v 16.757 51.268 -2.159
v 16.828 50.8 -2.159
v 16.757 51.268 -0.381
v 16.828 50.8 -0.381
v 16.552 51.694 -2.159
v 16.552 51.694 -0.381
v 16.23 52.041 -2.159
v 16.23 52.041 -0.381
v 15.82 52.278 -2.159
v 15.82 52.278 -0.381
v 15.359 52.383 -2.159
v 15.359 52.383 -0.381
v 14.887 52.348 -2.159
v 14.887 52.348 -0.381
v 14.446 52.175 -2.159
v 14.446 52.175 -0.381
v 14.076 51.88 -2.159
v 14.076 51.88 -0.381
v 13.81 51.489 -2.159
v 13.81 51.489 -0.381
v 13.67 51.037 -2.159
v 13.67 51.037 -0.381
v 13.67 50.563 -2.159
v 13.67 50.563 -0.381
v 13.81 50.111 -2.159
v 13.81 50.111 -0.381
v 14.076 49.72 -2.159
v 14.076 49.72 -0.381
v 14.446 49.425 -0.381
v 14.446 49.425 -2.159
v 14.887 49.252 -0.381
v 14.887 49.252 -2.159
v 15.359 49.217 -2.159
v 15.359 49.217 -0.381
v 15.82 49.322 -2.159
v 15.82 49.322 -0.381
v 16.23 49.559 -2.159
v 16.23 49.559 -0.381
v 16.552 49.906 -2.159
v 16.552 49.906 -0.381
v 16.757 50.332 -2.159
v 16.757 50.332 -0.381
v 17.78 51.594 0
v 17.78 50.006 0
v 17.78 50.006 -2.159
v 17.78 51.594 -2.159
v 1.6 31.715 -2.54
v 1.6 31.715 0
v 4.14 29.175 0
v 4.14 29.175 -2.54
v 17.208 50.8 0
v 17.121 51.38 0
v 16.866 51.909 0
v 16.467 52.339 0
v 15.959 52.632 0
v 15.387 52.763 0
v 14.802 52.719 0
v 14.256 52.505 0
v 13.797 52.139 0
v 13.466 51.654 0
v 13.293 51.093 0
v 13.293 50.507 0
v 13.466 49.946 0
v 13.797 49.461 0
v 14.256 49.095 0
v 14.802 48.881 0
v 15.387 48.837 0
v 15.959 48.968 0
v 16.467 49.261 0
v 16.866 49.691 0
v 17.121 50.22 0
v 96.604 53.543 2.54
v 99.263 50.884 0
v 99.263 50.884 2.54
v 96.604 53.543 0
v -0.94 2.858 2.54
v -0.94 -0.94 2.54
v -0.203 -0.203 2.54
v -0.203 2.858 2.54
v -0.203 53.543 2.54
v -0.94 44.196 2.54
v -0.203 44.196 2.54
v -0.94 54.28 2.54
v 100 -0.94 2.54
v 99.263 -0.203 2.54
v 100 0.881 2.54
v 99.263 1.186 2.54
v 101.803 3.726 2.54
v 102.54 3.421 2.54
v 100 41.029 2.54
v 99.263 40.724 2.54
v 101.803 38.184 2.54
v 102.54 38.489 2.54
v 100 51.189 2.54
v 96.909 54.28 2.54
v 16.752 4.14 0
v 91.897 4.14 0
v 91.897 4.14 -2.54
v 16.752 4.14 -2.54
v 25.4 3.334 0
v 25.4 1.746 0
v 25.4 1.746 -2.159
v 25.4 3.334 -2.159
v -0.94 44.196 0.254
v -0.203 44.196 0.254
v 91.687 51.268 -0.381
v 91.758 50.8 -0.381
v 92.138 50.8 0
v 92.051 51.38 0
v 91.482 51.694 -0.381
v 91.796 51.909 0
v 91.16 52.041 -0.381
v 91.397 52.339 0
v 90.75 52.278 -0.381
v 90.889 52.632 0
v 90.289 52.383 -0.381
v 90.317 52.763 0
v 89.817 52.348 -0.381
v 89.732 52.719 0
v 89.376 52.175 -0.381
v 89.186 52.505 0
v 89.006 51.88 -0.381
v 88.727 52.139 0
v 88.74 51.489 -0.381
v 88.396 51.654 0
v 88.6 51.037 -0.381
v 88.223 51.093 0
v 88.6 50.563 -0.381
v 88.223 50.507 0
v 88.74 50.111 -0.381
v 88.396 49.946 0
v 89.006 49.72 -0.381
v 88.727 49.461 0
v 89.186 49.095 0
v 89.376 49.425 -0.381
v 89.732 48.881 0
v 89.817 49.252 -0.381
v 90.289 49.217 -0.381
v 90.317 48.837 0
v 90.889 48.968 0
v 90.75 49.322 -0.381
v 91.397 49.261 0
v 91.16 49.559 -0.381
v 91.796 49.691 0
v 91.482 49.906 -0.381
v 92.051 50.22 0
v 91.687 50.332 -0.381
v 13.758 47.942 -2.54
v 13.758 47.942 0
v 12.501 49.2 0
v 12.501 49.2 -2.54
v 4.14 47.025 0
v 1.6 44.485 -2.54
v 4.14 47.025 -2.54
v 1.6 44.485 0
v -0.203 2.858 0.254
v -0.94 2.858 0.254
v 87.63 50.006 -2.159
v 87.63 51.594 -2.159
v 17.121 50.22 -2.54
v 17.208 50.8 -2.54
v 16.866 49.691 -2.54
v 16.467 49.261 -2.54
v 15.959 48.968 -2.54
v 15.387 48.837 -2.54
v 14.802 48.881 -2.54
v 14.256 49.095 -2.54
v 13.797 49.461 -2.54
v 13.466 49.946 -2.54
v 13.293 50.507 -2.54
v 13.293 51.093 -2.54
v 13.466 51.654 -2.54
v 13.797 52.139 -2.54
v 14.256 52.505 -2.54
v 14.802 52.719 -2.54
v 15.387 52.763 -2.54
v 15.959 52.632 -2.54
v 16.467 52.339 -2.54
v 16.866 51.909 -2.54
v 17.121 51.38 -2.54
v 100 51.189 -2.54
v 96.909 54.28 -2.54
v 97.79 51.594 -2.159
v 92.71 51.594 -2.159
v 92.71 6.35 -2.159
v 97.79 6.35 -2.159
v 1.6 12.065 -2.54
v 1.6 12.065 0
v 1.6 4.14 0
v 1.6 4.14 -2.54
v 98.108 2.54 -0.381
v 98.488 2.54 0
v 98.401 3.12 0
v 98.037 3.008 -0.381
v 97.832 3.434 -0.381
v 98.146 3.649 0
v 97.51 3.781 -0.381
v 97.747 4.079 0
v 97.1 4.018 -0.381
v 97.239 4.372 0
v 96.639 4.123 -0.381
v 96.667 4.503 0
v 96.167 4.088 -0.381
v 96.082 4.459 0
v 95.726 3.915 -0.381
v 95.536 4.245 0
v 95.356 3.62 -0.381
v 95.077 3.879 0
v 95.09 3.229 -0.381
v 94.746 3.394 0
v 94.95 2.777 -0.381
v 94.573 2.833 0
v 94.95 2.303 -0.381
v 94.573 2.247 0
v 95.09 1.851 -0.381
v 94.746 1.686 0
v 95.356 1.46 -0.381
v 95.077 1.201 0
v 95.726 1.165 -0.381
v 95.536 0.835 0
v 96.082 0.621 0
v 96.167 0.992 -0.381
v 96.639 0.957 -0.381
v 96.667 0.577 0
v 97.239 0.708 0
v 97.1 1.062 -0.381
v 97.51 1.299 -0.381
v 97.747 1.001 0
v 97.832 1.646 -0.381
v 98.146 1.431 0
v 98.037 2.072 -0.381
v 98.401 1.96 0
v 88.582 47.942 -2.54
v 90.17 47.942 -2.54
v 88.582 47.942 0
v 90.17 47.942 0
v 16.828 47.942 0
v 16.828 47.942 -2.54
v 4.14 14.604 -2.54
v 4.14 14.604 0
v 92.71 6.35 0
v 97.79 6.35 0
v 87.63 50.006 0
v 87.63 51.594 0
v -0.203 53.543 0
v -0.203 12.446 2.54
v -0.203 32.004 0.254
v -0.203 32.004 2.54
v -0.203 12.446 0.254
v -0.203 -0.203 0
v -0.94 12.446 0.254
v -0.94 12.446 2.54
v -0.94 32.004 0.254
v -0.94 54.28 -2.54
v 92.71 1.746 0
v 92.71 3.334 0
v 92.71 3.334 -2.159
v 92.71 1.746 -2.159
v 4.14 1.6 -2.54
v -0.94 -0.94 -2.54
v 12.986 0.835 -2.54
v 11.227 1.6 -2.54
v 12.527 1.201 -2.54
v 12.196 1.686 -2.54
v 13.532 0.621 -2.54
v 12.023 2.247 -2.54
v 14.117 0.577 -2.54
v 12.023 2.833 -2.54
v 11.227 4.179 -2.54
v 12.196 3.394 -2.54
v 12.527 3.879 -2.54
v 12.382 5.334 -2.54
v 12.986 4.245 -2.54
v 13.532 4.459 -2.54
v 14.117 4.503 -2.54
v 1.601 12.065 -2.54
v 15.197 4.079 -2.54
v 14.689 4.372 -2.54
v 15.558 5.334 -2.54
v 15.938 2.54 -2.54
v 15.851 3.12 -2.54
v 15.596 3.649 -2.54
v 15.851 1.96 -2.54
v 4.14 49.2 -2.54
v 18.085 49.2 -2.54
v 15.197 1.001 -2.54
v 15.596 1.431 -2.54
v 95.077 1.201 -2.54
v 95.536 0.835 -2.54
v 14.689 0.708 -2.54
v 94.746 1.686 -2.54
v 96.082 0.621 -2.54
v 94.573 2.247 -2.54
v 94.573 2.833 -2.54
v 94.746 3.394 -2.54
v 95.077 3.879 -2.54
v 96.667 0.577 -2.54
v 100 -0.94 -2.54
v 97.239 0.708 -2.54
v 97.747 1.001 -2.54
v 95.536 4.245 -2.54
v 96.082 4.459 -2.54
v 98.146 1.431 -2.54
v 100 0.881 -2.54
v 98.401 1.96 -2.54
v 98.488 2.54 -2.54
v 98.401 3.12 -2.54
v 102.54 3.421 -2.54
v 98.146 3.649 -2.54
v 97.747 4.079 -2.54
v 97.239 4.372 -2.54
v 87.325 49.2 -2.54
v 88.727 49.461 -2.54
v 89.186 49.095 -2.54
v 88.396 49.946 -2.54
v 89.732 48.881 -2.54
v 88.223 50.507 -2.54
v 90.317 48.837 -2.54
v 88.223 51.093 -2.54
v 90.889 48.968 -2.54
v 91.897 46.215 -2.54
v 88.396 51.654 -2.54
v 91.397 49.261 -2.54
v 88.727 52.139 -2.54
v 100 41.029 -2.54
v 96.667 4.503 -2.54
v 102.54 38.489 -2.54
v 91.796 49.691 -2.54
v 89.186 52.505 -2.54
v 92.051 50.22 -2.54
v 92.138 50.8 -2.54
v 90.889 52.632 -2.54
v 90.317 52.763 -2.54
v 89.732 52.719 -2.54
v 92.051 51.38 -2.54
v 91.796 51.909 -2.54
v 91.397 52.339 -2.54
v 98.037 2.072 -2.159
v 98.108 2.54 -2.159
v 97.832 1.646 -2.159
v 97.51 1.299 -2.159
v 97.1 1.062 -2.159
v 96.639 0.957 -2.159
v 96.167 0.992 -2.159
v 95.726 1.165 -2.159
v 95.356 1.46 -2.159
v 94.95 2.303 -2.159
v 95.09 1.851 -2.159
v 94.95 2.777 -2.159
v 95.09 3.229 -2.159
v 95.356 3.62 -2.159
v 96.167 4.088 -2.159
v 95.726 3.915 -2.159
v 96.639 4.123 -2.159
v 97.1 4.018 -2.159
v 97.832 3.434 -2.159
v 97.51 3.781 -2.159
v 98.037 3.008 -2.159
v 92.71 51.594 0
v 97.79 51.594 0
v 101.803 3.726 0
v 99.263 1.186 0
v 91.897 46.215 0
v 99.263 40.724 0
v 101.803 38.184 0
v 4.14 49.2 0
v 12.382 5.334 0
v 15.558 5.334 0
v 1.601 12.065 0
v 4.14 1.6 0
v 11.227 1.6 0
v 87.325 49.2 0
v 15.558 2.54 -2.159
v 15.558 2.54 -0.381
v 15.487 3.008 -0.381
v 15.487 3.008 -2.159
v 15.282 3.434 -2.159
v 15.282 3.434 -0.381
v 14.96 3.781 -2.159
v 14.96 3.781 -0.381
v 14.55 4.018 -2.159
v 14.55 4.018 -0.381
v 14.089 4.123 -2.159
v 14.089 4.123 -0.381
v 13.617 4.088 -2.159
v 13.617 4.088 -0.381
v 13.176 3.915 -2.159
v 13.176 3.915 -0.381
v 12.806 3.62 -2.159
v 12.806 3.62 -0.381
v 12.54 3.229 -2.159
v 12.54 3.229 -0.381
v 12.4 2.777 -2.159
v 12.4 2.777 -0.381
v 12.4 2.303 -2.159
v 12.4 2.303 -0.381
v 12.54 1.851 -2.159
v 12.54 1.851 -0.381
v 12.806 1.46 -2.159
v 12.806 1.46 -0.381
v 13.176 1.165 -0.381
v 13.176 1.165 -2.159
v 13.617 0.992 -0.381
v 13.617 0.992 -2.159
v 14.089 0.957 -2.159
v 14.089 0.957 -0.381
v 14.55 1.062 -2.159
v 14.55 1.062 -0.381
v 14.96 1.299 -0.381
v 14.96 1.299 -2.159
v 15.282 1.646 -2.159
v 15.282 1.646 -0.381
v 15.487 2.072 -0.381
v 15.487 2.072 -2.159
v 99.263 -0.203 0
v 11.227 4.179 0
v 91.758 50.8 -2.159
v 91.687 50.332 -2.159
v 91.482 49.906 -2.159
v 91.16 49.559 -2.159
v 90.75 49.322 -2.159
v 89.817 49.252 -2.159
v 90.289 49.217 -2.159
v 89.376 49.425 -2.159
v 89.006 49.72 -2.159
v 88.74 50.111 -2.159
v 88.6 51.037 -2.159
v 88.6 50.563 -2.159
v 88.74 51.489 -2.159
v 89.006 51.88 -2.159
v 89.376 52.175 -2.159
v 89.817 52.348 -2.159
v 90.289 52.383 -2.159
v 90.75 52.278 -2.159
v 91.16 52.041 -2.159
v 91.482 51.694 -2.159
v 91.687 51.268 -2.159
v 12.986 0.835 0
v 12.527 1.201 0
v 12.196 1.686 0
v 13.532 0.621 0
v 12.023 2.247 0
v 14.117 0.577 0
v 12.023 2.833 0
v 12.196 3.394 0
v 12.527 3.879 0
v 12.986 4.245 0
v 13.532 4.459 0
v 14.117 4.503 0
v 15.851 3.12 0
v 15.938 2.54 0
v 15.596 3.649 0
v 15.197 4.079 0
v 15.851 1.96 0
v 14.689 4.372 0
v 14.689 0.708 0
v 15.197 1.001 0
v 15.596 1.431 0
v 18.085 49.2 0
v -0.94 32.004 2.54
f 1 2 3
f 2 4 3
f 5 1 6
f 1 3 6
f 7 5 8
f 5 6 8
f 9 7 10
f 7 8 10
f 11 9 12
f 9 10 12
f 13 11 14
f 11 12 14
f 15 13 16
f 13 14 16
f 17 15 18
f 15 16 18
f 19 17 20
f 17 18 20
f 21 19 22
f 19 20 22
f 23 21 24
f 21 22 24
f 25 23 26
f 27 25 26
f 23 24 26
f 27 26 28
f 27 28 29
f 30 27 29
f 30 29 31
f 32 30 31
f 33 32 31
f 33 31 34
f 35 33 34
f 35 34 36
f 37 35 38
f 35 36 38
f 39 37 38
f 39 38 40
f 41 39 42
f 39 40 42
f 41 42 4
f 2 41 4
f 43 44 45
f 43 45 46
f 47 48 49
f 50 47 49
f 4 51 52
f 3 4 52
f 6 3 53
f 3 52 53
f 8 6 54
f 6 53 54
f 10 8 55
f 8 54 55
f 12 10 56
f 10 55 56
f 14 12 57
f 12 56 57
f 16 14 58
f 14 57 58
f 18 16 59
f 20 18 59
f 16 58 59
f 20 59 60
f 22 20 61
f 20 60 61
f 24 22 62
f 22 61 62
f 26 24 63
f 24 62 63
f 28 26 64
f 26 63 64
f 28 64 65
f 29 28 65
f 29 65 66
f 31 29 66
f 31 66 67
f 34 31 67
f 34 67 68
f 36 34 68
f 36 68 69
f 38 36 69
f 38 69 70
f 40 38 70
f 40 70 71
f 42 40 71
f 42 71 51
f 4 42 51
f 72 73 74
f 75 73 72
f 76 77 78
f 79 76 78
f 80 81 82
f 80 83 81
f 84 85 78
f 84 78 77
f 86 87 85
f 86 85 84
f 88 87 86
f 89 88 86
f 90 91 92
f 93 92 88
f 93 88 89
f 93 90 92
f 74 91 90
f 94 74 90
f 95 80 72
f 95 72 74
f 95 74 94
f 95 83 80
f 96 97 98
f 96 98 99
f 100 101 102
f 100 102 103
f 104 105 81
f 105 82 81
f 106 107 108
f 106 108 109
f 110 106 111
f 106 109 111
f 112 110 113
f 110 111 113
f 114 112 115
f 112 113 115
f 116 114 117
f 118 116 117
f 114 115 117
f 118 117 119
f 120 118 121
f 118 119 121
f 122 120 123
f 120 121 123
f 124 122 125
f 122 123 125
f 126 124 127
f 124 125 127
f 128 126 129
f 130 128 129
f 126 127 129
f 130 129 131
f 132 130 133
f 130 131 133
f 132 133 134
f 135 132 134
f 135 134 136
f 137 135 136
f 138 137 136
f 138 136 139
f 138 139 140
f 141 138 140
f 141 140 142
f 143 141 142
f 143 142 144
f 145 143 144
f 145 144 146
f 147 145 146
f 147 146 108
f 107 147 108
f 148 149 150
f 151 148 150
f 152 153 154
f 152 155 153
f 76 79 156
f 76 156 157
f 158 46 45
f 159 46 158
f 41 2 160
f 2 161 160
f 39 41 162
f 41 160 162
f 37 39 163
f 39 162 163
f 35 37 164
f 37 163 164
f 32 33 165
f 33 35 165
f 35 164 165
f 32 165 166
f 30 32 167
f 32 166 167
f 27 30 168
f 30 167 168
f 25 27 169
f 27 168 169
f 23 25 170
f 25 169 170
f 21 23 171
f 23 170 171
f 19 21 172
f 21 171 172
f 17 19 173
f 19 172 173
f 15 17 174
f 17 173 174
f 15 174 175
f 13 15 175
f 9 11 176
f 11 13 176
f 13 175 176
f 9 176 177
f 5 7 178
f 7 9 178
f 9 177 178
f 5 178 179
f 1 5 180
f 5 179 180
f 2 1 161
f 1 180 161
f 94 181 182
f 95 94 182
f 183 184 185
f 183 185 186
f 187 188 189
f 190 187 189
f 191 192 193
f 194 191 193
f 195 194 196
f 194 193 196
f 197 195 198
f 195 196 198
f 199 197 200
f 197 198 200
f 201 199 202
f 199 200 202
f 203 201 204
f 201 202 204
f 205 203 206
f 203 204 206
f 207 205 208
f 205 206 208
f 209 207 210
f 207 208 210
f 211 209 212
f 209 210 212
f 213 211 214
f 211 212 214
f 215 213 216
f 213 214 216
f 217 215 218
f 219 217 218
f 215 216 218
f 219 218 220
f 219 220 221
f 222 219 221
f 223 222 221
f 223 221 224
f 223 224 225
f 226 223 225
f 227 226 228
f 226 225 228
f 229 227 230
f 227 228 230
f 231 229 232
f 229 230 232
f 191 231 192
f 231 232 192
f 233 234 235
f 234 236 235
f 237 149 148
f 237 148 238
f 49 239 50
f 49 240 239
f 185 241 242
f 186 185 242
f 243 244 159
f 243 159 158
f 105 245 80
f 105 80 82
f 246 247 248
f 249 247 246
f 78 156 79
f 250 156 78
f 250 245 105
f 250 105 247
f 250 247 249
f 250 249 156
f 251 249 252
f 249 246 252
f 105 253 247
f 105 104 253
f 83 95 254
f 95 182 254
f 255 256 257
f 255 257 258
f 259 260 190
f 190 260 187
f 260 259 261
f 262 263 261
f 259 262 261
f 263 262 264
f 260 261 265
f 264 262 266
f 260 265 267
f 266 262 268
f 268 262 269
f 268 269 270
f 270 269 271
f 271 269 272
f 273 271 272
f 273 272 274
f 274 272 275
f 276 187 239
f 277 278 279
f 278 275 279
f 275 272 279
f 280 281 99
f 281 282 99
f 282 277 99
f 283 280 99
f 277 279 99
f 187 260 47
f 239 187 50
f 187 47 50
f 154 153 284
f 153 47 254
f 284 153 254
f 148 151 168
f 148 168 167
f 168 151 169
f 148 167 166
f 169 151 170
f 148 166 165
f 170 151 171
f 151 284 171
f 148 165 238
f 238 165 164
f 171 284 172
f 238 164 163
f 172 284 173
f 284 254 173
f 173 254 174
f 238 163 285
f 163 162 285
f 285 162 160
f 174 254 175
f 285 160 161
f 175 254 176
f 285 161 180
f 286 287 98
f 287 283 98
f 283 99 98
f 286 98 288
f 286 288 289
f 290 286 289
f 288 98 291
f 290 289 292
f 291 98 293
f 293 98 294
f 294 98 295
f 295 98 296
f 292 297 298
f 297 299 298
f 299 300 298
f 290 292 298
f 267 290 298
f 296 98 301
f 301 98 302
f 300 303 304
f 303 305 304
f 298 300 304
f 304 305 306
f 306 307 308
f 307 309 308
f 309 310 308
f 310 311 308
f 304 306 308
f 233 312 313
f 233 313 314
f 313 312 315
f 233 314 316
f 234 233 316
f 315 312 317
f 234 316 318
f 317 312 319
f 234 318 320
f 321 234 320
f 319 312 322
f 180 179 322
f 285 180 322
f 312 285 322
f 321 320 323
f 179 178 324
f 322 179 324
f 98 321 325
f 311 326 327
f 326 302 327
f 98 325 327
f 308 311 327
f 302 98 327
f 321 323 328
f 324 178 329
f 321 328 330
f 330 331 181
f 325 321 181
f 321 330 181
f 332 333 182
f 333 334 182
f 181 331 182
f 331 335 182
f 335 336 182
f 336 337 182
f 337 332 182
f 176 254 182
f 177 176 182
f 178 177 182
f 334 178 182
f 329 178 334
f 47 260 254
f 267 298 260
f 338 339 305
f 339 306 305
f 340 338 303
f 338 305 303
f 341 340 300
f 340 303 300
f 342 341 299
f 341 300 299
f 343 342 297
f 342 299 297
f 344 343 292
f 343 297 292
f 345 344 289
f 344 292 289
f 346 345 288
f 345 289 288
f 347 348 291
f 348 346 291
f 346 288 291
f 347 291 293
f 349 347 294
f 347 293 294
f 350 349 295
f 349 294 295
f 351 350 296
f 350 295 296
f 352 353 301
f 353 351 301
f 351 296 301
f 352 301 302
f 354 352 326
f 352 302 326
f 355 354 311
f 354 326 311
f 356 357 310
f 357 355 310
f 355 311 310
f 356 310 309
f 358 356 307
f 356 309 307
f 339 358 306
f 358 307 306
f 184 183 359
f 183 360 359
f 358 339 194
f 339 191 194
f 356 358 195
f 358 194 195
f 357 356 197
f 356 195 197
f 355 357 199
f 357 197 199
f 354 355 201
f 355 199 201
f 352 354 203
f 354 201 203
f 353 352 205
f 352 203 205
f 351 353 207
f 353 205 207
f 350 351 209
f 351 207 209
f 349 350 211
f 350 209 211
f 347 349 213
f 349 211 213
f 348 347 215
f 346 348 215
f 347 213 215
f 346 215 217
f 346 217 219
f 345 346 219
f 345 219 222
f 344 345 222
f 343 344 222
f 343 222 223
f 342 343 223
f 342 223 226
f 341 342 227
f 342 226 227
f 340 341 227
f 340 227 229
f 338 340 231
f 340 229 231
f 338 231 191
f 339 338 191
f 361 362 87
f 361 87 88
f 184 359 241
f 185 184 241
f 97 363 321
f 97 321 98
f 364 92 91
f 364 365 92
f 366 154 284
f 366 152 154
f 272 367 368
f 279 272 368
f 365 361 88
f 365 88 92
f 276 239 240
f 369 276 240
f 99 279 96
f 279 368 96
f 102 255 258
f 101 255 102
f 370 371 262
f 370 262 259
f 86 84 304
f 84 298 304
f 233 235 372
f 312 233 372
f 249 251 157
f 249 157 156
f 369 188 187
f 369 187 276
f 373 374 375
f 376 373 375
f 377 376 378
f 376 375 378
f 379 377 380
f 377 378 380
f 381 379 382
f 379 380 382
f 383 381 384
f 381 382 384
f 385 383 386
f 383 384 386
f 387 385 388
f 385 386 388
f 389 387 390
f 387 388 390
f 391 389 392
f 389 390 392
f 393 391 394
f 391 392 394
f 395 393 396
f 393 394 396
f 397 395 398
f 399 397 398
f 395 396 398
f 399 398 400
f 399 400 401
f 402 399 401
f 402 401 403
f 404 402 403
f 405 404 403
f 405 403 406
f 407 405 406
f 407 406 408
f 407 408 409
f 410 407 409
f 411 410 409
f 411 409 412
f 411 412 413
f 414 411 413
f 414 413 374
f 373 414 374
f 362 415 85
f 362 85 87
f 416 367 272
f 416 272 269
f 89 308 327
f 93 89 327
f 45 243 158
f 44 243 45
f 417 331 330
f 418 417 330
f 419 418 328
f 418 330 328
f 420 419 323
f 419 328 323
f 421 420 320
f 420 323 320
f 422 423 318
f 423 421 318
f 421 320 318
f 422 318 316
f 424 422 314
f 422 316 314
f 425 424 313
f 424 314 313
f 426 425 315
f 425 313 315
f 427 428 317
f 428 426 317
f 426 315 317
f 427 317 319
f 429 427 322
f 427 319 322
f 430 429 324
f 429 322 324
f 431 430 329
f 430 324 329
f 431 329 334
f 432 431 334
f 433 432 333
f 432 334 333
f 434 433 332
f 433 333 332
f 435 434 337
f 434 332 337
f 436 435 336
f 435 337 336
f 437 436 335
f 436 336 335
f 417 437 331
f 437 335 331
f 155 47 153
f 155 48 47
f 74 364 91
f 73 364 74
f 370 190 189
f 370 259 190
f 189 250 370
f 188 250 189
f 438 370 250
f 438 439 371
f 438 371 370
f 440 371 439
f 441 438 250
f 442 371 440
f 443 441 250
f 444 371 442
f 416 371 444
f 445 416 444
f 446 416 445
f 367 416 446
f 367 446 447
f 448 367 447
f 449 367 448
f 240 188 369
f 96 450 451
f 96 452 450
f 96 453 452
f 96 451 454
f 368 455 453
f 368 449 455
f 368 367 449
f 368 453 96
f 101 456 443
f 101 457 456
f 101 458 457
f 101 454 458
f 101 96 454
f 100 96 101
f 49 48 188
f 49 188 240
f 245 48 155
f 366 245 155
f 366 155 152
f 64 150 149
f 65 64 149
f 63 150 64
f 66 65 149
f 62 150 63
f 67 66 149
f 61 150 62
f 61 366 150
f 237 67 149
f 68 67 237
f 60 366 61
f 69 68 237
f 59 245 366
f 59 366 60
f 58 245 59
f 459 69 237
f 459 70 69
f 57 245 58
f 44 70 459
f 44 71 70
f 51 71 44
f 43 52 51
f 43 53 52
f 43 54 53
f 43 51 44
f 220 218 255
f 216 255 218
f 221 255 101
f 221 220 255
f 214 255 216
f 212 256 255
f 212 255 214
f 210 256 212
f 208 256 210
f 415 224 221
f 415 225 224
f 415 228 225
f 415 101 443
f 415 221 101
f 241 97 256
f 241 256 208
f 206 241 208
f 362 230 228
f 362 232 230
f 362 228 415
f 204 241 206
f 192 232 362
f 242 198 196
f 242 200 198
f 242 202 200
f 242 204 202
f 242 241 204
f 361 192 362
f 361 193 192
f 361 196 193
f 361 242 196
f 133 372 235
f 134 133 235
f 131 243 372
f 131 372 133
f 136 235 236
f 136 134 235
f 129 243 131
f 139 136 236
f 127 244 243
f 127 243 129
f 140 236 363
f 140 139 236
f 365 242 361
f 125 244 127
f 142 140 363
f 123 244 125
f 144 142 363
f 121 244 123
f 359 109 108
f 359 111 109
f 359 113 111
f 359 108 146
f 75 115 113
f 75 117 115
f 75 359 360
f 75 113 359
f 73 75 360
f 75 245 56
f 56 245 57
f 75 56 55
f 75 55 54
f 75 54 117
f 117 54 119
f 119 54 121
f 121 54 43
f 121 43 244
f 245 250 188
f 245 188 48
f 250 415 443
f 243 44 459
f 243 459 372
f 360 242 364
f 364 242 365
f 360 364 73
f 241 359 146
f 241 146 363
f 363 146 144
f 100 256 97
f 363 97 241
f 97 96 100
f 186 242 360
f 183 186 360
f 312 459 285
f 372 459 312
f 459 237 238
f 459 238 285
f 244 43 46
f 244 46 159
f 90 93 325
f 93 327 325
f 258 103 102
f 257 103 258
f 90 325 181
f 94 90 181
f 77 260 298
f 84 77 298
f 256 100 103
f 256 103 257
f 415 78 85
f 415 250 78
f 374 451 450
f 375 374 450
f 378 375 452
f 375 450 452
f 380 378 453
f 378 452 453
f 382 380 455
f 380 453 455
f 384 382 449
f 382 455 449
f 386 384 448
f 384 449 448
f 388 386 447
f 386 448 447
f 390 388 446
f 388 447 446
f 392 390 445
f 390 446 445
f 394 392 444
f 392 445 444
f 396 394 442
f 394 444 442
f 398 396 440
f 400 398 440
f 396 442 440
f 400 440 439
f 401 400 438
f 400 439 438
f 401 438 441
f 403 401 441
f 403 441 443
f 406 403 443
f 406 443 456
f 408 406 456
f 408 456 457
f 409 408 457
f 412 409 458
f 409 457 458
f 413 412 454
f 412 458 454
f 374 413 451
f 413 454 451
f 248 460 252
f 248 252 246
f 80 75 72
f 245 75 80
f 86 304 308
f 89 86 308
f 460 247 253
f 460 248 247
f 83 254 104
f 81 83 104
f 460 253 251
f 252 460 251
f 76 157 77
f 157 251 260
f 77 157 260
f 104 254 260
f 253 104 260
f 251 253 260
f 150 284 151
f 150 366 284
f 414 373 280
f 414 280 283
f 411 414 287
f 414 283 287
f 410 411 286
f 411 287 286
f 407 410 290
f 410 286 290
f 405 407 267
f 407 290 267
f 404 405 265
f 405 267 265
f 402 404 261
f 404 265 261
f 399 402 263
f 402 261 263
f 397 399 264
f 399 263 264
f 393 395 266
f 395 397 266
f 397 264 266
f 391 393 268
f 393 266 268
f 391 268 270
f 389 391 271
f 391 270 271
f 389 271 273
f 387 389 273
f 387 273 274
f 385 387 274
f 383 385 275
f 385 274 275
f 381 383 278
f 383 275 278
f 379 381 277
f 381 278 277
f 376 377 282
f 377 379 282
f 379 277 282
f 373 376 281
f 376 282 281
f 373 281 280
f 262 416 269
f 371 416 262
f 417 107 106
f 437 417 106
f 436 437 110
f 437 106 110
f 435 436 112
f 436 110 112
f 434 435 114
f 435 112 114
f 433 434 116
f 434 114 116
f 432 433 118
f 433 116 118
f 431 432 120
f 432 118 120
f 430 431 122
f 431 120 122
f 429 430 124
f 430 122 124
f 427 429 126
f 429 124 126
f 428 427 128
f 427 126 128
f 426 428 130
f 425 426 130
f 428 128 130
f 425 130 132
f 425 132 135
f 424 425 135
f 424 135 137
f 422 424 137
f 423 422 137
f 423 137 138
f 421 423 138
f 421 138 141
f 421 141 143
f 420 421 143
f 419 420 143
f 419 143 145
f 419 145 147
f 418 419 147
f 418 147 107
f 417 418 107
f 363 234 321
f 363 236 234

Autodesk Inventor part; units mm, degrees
ref_plane "YZ Plane" through (0, 0, 0) normal (1, 0, 0) x (0, 1, 0)
ref_plane "XZ Plane" through (0, 0, 0) normal (0, 1, 0) x (-1, 0, 0)
ref_plane "XY Plane" through (0, 0, 0) normal (0, 0, 1) x (1, 0, 0)
sketch "Sketch1" plane through (0, 0, 0) normal (0, 0, 1) x (1, 0, 0)
  line L0 (0, 53.34) -> (96.52, 53.34)
  line L1 (96.52, 53.34) -> (99.06, 50.8)
  line L2 (99.06, 50.8) -> (99.06, 40.64)
  line L3 (99.06, 40.64) -> (101.6, 38.1)
  line L4 (101.6, 38.1) -> (101.6, 3.81)
  line L5 (99.06, 0) -> (0, 0)
  line L6 (0, 0) -> (0, 53.34)
  line L7 (101.6, 3.81) -> (99.06, 1.27)
  line L8 (99.06, 1.27) -> (99.06, 0)
  line L9 (96.9093, 54.2798) -> (-0.9398, 54.2798)
  line L10 (-0.9398, 54.2798) -> (-0.9398, -0.9398)
  line L11 (-0.9398, -0.9398) -> (99.9998, -0.9398)
  line L12 (99.9998, -0.9398) -> (99.9998, 0.8807)
  line L13 (99.9998, 0.8807) -> (102.5398, 3.4207)
  line L14 (102.5398, 3.4207) -> (102.5398, 38.4893)
  line L15 (102.5398, 38.4893) -> (99.9998, 41.0293)
  line L16 (99.9998, 41.0293) -> (99.9998, 51.1893)
  line L17 (99.9998, 51.1893) -> (96.9093, 54.2798)
  line L18 (96.6042, 53.5432) -> (-0.2032, 53.5432)
  line L19 (-0.2032, 53.5432) -> (-0.2032, -0.2032)
  line L20 (-0.2032, -0.2032) -> (99.2632, -0.2032)
  line L21 (99.2632, -0.2032) -> (99.2632, 1.1858)
  line L22 (99.2632, 1.1858) -> (101.8032, 3.7258)
  line L23 (101.8032, 3.7258) -> (101.8032, 38.1842)
  line L24 (101.8032, 38.1842) -> (99.2632, 40.7242)
  line L25 (99.2632, 40.7242) -> (99.2632, 50.8842)
  line L26 (99.2632, 50.8842) -> (96.6042, 53.5432)
  point P0 (0, 0)
  dimension "d0" = 96.52
  dimension "d1" = 53.34
  dimension "d4" = 99.06
  dimension "d5" = 50.8
  dimension "d6" = 101.6
  dimension "d7" = 40.64
  dimension "d8" = 38.1
  dimension "d9" = 99.06
  dimension "d10" = 1.27
  dimension "d11" = 3.81
  dimension "d15" = 0.2032
  dimension "d18" = 0.7366
extrude "Extrusion2" add sketch "Sketch1" along normal blind 2.54 contours L17 L16 L15 L14 L13 L12 L11 L10 L9
sketch "Sketch2" plane through (0, 0, 0) normal (0, 0, 1) x (1, 0, 0)
  line L0 (0, 53.34) -> (96.52, 53.34)
  line L1 (96.52, 53.34) -> (99.06, 50.8)
  line L2 (99.06, 50.8) -> (99.06, 40.64)
  line L3 (99.06, 40.64) -> (101.6, 38.1)
  line L4 (101.6, 38.1) -> (101.6, 3.81)
  line L5 (99.06, 0) -> (0, 0)
  line L6 (0, 0) -> (0, 53.34)
  line L7 (101.6, 3.81) -> (99.06, 1.27)
  line L8 (99.06, 1.27) -> (99.06, 0)
  line L9 (96.9093, 54.2798) -> (-0.9398, 54.2798)
  line L10 (-0.9398, 54.2798) -> (-0.9398, -0.9398)
  line L11 (-0.9398, -0.9398) -> (99.9998, -0.9398)
  line L12 (99.9998, -0.9398) -> (99.9998, 0.8807)
  line L13 (99.9998, 0.8807) -> (102.5398, 3.4207)
  line L14 (102.5398, 3.4207) -> (102.5398, 38.4893)
  line L15 (102.5398, 38.4893) -> (99.9998, 41.0293)
  line L16 (99.9998, 41.0293) -> (99.9998, 51.1893)
  line L17 (99.9998, 51.1893) -> (96.9093, 54.2798)
  line L18 (96.6042, 53.5432) -> (-0.2032, 53.5432)
  line L19 (-0.2032, 53.5432) -> (-0.2032, -0.2032)
  line L20 (-0.2032, -0.2032) -> (99.2632, -0.2032)
  line L21 (99.2632, -0.2032) -> (99.2632, 1.1858)
  line L22 (99.2632, 1.1858) -> (101.8032, 3.7258)
  line L23 (101.8032, 3.7258) -> (101.8032, 38.1842)
  line L24 (101.8032, 38.1842) -> (99.2632, 40.7242)
  line L25 (99.2632, 40.7242) -> (99.2632, 50.8842)
  line L26 (99.2632, 50.8842) -> (96.6042, 53.5432)
  line L27 (4.1402, 4.1402) -> (4.1402, 49.1998)
  circle A0 centre (15.24, 50.8) radius 1.5875
  circle A1 centre (13.97, 2.54) radius 1.5875
  line L28 (13.7585, 47.9425) -> (16.8275, 47.9425)
  line L29 (16.8275, 47.9425) -> (18.0848, 49.1998)
  line L30 (13.7585, 47.9425) -> (12.5012, 49.1998)
  line L31 (4.1402, 49.1998) -> (12.5012, 49.1998)
  line L32 (18.0848, 49.1998) -> (87.3252, 49.1998)
  line L33 (12.3825, 5.3344) -> (15.5575, 5.3344)
  line L34 (15.5575, 5.3344) -> (16.7517, 4.1402)
  line L35 (12.3825, 5.3344) -> (11.1883, 4.1402)
  line L36 (91.8972, 4.1402) -> (16.7517, 4.1402)
  line L37 (11.1883, 4.1402) -> (4.1402, 4.1402)
  line L38 (91.8972, 46.2153) -> (91.8972, 4.1402)
  circle A2 centre (90.17, 50.8) radius 1.5875
  circle A3 centre (96.52, 2.54) radius 1.5875
  line L39 (90.17, 47.9425) -> (88.5825, 47.9425)
  line L40 (88.5825, 47.9425) -> (87.3252, 49.1998)
  line L41 (90.17, 47.9425) -> (91.8972, 46.2153)
  point P0 (0, 0)
  point P1 (0, 1.4137)
  dimension "d19" = 96.52
  dimension "d20" = 53.34
  dimension "d21" = 99.06
  dimension "d22" = 50.8
  dimension "d23" = 101.6
  dimension "d24" = 40.64
  dimension "d25" = 38.1
  dimension "d26" = 99.06
  dimension "d27" = 1.27
  dimension "d28" = 3.81
  dimension "d29" = 0.2032
  dimension "d30" = 0.7366
  dimension "d70" = 13.97
  dimension "d71" = 2.54
  dimension "d72" = 3.175
  dimension "d73" = 50.8
  dimension "d74" = 3.175
  dimension "d75" = 15.24
  dimension "d135" = 2.54
  dimension "d136" = 1.27
  dimension "d146" = 4.1402
  dimension "d148" = 91.8972
  dimension "d150" = 3.175
  dimension "d151" = 3.175
  dimension "d152" = 90.17
  dimension "d153" = 50.8
  dimension "d154" = 1.27
  dimension "d155" = 2.54
  dimension "d156" = 96.52
extrude "Extrusion3" add sketch "Sketch2" against normal blind 2.54 contours L0 L1 L2 L3 L4 L7 L8 L5 L6 | L17 L16 L15 L14 L13 L12 L11 L10 L9 | L26 L25 L24 L23 L22 L21 L20 L19 L18
sketch "Sketch4" plane through (0, 0, 2.54) normal (0, 0, 1) x (1, 0, 0)
  line L0 (-0.2032, -0.2032) -> (-0.2032, 53.5432) projected
  line L1 (-0.9398, -0.9398) -> (-0.9398, 54.2798) projected
  line L2 (-0.2032, 12.446) -> (-0.9398, 12.446)
  line L3 (-0.2032, 2.8575) -> (-0.9398, 2.8575)
  line L4 (-0.2032, 32.004) -> (-0.9398, 32.004)
  line L5 (-0.2032, 44.196) -> (-0.9398, 44.196)
  point P0 (0, 0)
  dimension "d35" = 12.446
  dimension "d36" = 2.8575
  dimension "d37" = 32.004
  dimension "d38" = 44.196
extrude "Extrusion4" cut sketch "Sketch4" against normal blind 2.286 contours L3 L1 L2 L0 | L4 L1 L5 L0
sketch "Sketch5" plane through (0, 0, 0) normal (0, 0, 1) x (1, 0, 0)
  line L0 (25.4, 3.3338) -> (92.71, 3.3338)
  line L1 (92.71, 3.3338) -> (92.71, 1.7463)
  line L2 (92.71, 1.7463) -> (25.4, 1.7463)
  line L3 (25.4, 1.7463) -> (25.4, 3.3338)
  line L4 (17.78, 51.5938) -> (87.63, 51.5938)
  line L5 (87.63, 51.5938) -> (87.63, 50.0063)
  line L6 (87.63, 50.0063) -> (17.78, 50.0062)
  line L7 (17.78, 50.0062) -> (17.78, 51.5938)
  line L8 (-0.2032, 53.5432) -> (-0.2032, -0.2032) projected
  line L9 (-0.2032, 12.065) -> (11.2268, 12.065)
  line L10 (11.2268, 12.065) -> (11.2268, 1.6002)
  line L11 (11.2268, 1.6002) -> (-0.2032, 1.6002)
  line L12 (-0.2032, 1.6002) -> (-0.2032, 12.065)
  line L13 (1.6002, 12.065) -> (1.6002, 1.6002)
  line L14 (4.1402, 4.1402) -> (4.1402, 49.1998) projected
  line L15 (4.1402, 49.1998) -> (12.5012, 49.1998) projected
  line L16 (91.8972, 4.1402) -> (16.7517, 4.1402) projected
  line L17 (99.2632, 50.8842) -> (96.6042, 53.5432) projected
  line L18 (96.6042, 53.5432) -> (-0.2032, 53.5432) projected
  line L19 (-0.2032, 53.5432) -> (-0.2032, -0.2032) projected
  line L20 (-0.2032, -0.2032) -> (99.2632, -0.2032) projected
  line L21 (99.2632, -0.2032) -> (99.2632, 1.1858) projected
  line L22 (99.2632, 1.1858) -> (101.8032, 3.7258) projected
  line L23 (101.8032, 3.7258) -> (101.8032, 38.1842) projected
  line L24 (101.8032, 38.1842) -> (99.2632, 40.7242) projected
  line L25 (99.2632, 40.7242) -> (99.2632, 50.8842) projected
  line L26 (91.8972, 4.1402) -> (16.7517, 4.1402) projected
  line L27 (4.1402, 4.1402) -> (4.1402, 49.1998) projected
  line L28 (1.6002, 44.4853) -> (4.1402, 47.0253)
  line L29 (99.2632, 40.7242) -> (99.2632, 50.8842) projected
  line L30 (1.6002, 31.7147) -> (4.1402, 29.1747)
  line L31 (1.6002, 31.7147) -> (1.6002, 44.4853)
  line L32 (4.1402, 47.0253) -> (4.1402, 29.1747)
  line L33 (12.5012, 49.1998) -> (13.7585, 47.9425) projected
  line L34 (13.7585, 47.9425) -> (16.8275, 47.9425) projected
  line L35 (16.8275, 47.9425) -> (18.0848, 49.1998) projected
  line L36 (18.0848, 49.1998) -> (87.3252, 49.1998) projected
  line L37 (11.1883, 4.1402) -> (4.1402, 4.1402) projected
  line L38 (16.7517, 4.1402) -> (15.5575, 5.3344) projected
  line L39 (15.5575, 5.3344) -> (12.3825, 5.3344) projected
  line L40 (12.3825, 5.3344) -> (11.1883, 4.1402) projected
  line L41 (15.5575, 5.3344) -> (12.3825, 5.3344) projected
  line L42 (97.79, 51.5938) -> (92.71, 51.5938)
  line L43 (92.71, 51.5938) -> (92.71, 6.35)
  line L44 (92.71, 6.35) -> (97.79, 6.35)
  line L45 (97.79, 6.35) -> (97.79, 51.5938)
  line L46 (91.8972, 46.2153) -> (91.8972, 4.1402) projected
  line L47 (87.3252, 49.1998) -> (88.5825, 47.9425) projected
  line L48 (88.5825, 47.9425) -> (90.17, 47.9425) projected
  line L49 (90.17, 47.9425) -> (91.8972, 46.2153) projected
  point P0 (0, 0)
  point P1 (61.8998, 4.1402)
  dimension "d41" = 1.5875
  dimension "d42" = 25.4
  dimension "d43" = 92.71
  dimension "d44" = 17.78
  dimension "d45" = 87.63
  dimension "d46" = 1.5875
  dimension "d47" = 51.5938
  dimension "d48" = 1.7463
  dimension "d51" = 0
  dimension "d52" = 12.065
  dimension "d54" = 11.43
  dimension "d97" = 2.54
  dimension "d101" = 2.54
  dimension "d102" = 2.54
  dimension "d142" = 5.08
  dimension "d143" = 0
  dimension "d145" = 6.35
  dimension "d149" = 92.71
extrude "Extrusion5" cut sketch "Sketch5" against normal blind 2.159 contours L0 L1 L2 L3 | L4 L5 L6 L7 | L45 L44 L43 L42
sketch "Sketch7" plane through (0, 0, 0) normal (0, 0, 1) x (1, 0, 0)
  line L0 (25.4, 3.3338) -> (64.77, 3.3338)
  line L1 (64.77, 3.3338) -> (64.77, 1.7463)
  line L2 (64.77, 1.7463) -> (25.4, 1.7463)
  line L3 (25.4, 1.7463) -> (25.4, 3.3338)
  line L4 (17.78, 51.5938) -> (64.77, 51.5938)
  line L5 (64.77, 51.5938) -> (64.77, 50.0062)
  line L6 (64.77, 50.0062) -> (17.78, 50.0062)
  line L7 (17.78, 50.0062) -> (17.78, 51.5938)
  line L8 (-0.2032, 53.5432) -> (-0.2032, -0.2032)
  line L9 (-0.2032, 12.065) -> (11.2268, 12.065)
  line L10 (11.2268, 12.065) -> (11.2268, 1.6002)
  line L11 (11.2268, 1.6002) -> (-0.2032, 1.6002)
  line L12 (-0.2032, 1.6002) -> (-0.2032, 12.065)
  line L13 (1.6002, 12.065) -> (1.6002, 1.6002)
  line L14 (63.627, 30.43) -> (66.167, 30.43) construction
  line L15 (63.627, 25.35) -> (63.627, 30.43) construction
  line L16 (66.167, 30.43) -> (66.167, 25.35) construction
  line L17 (66.167, 25.35) -> (63.627, 25.35) construction
  line L18 (4.1402, 4.1402) -> (4.1402, 49.1998)
  line L19 (4.1402, 49.1998) -> (61.8998, 49.1998)
  line L20 (61.8998, 49.1998) -> (61.8998, 38.6711)
  line L21 (61.8998, 38.6711) -> (64.4398, 36.1311)
  line L22 (64.4398, 6.866) -> (64.4398, 6.7949)
  line L23 (64.4398, 6.7949) -> (61.8998, 4.2549)
  line L24 (61.8998, 4.2549) -> (61.8998, 4.1402)
  line L25 (61.8998, 4.1402) -> (4.1402, 4.1402)
  line L26 (66.2432, 51.9002) -> (64.6002, 53.5432)
  line L27 (64.6002, 53.5432) -> (-0.2032, 53.5432)
  line L28 (-0.2032, 53.5432) -> (-0.2032, -0.2032)
  line L29 (-0.2032, -0.2032) -> (66.2432, -0.2032)
  line L30 (66.2432, -0.2032) -> (66.2432, 2.4558)
  line L31 (66.2432, 2.4558) -> (68.7832, 4.9958)
  line L32 (68.7832, 4.9958) -> (68.7832, 37.9302)
  line L33 (68.7832, 37.9302) -> (66.2432, 40.4702)
  line L34 (66.2432, 40.4702) -> (66.2432, 51.9002)
  line L35 (64.4398, 36.1311) -> (64.4398, 6.7949)
  line L36 (65.7098, 32.462) -> (66.9798, 31.192)
  line L37 (65.7098, 23.318) -> (66.9798, 24.588)
  line L38 (66.9798, 31.192) -> (66.9798, 24.588)
  line L39 (64.4398, 33.732) -> (64.4398, 22.048)
  line L40 (61.8998, 4.1402) -> (4.1402, 4.1402)
  line L41 (4.1402, 4.1402) -> (4.1402, 49.1998)
  line L42 (1.6002, 44.4853) -> (4.1402, 47.0253)
  line L43 (66.2432, 40.4702) -> (66.2432, 51.9002)
  line L44 (1.6002, 31.7147) -> (4.1402, 29.1747)
  line L45 (1.6002, 31.7147) -> (1.6002, 44.4853)
  line L46 (4.1402, 47.0253) -> (4.1402, 29.1747)
  arc A0 (64.4398, 8.374) -> (64.4398, 6.866) centre (65.8368, 7.62) ccw
  line L47 (64.4398, 36.1311) -> (64.4398, 8.374)
  line L48 (64.4398, 32.462) -> (65.7098, 32.462)
  line L49 (65.7098, 23.318) -> (65.0748, 23.318)
  line L50 (65.0748, 23.318) -> (64.4398, 22.683)
  point P0 (0, 0)
  point P1 (0, 0)
  point P2 (64.4398, 31.192)
  point P3 (64.4398, 31.192)
  point P4 (64.4398, 24.588)
  point P5 (64.4398, 24.588)
  dimension "d106" = 1.5875
  dimension "d107" = 25.4
  dimension "d108" = 64.77
  dimension "d109" = 17.78
  dimension "d110" = 64.77
  dimension "d111" = 1.5875
  dimension "d112" = 51.5938
  dimension "d113" = 1.7463
  dimension "d114" = 0
  dimension "d115" = 12.065
  dimension "d116" = 11.43
  dimension "d117" = 2.54
  dimension "d118" = 2.54
  dimension "d119" = 2.54
  dimension "d120" = 2.54
  dimension "d121" = 2.54
  dimension "d122" = 2.54
  dimension "d123" = 2.54
extrude "Extrusion7" cut sketch "Sketch7" against normal through all contours L9 L18 L25 L10 L11 L13 | L9 L10 L25 L18 | L44 L45 L42 L18 | L48 L36 L38 L37 L49 L50 L35
chamfer "Chamfer3" distance 2.54 angle 45 1 edges at (4.1402, 12.065, -1.27)
chamfer "Chamfer5" distance 2.54 angle 45 1 edges at (1.6002, 1.6002, -1.27)
chamfer "Chamfer6" distance 0.381 angle 45 8 edges at (12.3825, 2.54, 0) (13.6525, 50.8, 0) (13.6525, 50.8, -2.54) (12.3825, 2.54, -2.54) (94.9325, 2.54, -2.54) (88.5825, 50.8, -2.54) (88.5825, 50.8, 0) (94.9325, 2.54, 0)
equation "\"d97\" = d101"
equation "\"d102\" = d101"
properties part number "Arduino MEGA Bumper 0003"
